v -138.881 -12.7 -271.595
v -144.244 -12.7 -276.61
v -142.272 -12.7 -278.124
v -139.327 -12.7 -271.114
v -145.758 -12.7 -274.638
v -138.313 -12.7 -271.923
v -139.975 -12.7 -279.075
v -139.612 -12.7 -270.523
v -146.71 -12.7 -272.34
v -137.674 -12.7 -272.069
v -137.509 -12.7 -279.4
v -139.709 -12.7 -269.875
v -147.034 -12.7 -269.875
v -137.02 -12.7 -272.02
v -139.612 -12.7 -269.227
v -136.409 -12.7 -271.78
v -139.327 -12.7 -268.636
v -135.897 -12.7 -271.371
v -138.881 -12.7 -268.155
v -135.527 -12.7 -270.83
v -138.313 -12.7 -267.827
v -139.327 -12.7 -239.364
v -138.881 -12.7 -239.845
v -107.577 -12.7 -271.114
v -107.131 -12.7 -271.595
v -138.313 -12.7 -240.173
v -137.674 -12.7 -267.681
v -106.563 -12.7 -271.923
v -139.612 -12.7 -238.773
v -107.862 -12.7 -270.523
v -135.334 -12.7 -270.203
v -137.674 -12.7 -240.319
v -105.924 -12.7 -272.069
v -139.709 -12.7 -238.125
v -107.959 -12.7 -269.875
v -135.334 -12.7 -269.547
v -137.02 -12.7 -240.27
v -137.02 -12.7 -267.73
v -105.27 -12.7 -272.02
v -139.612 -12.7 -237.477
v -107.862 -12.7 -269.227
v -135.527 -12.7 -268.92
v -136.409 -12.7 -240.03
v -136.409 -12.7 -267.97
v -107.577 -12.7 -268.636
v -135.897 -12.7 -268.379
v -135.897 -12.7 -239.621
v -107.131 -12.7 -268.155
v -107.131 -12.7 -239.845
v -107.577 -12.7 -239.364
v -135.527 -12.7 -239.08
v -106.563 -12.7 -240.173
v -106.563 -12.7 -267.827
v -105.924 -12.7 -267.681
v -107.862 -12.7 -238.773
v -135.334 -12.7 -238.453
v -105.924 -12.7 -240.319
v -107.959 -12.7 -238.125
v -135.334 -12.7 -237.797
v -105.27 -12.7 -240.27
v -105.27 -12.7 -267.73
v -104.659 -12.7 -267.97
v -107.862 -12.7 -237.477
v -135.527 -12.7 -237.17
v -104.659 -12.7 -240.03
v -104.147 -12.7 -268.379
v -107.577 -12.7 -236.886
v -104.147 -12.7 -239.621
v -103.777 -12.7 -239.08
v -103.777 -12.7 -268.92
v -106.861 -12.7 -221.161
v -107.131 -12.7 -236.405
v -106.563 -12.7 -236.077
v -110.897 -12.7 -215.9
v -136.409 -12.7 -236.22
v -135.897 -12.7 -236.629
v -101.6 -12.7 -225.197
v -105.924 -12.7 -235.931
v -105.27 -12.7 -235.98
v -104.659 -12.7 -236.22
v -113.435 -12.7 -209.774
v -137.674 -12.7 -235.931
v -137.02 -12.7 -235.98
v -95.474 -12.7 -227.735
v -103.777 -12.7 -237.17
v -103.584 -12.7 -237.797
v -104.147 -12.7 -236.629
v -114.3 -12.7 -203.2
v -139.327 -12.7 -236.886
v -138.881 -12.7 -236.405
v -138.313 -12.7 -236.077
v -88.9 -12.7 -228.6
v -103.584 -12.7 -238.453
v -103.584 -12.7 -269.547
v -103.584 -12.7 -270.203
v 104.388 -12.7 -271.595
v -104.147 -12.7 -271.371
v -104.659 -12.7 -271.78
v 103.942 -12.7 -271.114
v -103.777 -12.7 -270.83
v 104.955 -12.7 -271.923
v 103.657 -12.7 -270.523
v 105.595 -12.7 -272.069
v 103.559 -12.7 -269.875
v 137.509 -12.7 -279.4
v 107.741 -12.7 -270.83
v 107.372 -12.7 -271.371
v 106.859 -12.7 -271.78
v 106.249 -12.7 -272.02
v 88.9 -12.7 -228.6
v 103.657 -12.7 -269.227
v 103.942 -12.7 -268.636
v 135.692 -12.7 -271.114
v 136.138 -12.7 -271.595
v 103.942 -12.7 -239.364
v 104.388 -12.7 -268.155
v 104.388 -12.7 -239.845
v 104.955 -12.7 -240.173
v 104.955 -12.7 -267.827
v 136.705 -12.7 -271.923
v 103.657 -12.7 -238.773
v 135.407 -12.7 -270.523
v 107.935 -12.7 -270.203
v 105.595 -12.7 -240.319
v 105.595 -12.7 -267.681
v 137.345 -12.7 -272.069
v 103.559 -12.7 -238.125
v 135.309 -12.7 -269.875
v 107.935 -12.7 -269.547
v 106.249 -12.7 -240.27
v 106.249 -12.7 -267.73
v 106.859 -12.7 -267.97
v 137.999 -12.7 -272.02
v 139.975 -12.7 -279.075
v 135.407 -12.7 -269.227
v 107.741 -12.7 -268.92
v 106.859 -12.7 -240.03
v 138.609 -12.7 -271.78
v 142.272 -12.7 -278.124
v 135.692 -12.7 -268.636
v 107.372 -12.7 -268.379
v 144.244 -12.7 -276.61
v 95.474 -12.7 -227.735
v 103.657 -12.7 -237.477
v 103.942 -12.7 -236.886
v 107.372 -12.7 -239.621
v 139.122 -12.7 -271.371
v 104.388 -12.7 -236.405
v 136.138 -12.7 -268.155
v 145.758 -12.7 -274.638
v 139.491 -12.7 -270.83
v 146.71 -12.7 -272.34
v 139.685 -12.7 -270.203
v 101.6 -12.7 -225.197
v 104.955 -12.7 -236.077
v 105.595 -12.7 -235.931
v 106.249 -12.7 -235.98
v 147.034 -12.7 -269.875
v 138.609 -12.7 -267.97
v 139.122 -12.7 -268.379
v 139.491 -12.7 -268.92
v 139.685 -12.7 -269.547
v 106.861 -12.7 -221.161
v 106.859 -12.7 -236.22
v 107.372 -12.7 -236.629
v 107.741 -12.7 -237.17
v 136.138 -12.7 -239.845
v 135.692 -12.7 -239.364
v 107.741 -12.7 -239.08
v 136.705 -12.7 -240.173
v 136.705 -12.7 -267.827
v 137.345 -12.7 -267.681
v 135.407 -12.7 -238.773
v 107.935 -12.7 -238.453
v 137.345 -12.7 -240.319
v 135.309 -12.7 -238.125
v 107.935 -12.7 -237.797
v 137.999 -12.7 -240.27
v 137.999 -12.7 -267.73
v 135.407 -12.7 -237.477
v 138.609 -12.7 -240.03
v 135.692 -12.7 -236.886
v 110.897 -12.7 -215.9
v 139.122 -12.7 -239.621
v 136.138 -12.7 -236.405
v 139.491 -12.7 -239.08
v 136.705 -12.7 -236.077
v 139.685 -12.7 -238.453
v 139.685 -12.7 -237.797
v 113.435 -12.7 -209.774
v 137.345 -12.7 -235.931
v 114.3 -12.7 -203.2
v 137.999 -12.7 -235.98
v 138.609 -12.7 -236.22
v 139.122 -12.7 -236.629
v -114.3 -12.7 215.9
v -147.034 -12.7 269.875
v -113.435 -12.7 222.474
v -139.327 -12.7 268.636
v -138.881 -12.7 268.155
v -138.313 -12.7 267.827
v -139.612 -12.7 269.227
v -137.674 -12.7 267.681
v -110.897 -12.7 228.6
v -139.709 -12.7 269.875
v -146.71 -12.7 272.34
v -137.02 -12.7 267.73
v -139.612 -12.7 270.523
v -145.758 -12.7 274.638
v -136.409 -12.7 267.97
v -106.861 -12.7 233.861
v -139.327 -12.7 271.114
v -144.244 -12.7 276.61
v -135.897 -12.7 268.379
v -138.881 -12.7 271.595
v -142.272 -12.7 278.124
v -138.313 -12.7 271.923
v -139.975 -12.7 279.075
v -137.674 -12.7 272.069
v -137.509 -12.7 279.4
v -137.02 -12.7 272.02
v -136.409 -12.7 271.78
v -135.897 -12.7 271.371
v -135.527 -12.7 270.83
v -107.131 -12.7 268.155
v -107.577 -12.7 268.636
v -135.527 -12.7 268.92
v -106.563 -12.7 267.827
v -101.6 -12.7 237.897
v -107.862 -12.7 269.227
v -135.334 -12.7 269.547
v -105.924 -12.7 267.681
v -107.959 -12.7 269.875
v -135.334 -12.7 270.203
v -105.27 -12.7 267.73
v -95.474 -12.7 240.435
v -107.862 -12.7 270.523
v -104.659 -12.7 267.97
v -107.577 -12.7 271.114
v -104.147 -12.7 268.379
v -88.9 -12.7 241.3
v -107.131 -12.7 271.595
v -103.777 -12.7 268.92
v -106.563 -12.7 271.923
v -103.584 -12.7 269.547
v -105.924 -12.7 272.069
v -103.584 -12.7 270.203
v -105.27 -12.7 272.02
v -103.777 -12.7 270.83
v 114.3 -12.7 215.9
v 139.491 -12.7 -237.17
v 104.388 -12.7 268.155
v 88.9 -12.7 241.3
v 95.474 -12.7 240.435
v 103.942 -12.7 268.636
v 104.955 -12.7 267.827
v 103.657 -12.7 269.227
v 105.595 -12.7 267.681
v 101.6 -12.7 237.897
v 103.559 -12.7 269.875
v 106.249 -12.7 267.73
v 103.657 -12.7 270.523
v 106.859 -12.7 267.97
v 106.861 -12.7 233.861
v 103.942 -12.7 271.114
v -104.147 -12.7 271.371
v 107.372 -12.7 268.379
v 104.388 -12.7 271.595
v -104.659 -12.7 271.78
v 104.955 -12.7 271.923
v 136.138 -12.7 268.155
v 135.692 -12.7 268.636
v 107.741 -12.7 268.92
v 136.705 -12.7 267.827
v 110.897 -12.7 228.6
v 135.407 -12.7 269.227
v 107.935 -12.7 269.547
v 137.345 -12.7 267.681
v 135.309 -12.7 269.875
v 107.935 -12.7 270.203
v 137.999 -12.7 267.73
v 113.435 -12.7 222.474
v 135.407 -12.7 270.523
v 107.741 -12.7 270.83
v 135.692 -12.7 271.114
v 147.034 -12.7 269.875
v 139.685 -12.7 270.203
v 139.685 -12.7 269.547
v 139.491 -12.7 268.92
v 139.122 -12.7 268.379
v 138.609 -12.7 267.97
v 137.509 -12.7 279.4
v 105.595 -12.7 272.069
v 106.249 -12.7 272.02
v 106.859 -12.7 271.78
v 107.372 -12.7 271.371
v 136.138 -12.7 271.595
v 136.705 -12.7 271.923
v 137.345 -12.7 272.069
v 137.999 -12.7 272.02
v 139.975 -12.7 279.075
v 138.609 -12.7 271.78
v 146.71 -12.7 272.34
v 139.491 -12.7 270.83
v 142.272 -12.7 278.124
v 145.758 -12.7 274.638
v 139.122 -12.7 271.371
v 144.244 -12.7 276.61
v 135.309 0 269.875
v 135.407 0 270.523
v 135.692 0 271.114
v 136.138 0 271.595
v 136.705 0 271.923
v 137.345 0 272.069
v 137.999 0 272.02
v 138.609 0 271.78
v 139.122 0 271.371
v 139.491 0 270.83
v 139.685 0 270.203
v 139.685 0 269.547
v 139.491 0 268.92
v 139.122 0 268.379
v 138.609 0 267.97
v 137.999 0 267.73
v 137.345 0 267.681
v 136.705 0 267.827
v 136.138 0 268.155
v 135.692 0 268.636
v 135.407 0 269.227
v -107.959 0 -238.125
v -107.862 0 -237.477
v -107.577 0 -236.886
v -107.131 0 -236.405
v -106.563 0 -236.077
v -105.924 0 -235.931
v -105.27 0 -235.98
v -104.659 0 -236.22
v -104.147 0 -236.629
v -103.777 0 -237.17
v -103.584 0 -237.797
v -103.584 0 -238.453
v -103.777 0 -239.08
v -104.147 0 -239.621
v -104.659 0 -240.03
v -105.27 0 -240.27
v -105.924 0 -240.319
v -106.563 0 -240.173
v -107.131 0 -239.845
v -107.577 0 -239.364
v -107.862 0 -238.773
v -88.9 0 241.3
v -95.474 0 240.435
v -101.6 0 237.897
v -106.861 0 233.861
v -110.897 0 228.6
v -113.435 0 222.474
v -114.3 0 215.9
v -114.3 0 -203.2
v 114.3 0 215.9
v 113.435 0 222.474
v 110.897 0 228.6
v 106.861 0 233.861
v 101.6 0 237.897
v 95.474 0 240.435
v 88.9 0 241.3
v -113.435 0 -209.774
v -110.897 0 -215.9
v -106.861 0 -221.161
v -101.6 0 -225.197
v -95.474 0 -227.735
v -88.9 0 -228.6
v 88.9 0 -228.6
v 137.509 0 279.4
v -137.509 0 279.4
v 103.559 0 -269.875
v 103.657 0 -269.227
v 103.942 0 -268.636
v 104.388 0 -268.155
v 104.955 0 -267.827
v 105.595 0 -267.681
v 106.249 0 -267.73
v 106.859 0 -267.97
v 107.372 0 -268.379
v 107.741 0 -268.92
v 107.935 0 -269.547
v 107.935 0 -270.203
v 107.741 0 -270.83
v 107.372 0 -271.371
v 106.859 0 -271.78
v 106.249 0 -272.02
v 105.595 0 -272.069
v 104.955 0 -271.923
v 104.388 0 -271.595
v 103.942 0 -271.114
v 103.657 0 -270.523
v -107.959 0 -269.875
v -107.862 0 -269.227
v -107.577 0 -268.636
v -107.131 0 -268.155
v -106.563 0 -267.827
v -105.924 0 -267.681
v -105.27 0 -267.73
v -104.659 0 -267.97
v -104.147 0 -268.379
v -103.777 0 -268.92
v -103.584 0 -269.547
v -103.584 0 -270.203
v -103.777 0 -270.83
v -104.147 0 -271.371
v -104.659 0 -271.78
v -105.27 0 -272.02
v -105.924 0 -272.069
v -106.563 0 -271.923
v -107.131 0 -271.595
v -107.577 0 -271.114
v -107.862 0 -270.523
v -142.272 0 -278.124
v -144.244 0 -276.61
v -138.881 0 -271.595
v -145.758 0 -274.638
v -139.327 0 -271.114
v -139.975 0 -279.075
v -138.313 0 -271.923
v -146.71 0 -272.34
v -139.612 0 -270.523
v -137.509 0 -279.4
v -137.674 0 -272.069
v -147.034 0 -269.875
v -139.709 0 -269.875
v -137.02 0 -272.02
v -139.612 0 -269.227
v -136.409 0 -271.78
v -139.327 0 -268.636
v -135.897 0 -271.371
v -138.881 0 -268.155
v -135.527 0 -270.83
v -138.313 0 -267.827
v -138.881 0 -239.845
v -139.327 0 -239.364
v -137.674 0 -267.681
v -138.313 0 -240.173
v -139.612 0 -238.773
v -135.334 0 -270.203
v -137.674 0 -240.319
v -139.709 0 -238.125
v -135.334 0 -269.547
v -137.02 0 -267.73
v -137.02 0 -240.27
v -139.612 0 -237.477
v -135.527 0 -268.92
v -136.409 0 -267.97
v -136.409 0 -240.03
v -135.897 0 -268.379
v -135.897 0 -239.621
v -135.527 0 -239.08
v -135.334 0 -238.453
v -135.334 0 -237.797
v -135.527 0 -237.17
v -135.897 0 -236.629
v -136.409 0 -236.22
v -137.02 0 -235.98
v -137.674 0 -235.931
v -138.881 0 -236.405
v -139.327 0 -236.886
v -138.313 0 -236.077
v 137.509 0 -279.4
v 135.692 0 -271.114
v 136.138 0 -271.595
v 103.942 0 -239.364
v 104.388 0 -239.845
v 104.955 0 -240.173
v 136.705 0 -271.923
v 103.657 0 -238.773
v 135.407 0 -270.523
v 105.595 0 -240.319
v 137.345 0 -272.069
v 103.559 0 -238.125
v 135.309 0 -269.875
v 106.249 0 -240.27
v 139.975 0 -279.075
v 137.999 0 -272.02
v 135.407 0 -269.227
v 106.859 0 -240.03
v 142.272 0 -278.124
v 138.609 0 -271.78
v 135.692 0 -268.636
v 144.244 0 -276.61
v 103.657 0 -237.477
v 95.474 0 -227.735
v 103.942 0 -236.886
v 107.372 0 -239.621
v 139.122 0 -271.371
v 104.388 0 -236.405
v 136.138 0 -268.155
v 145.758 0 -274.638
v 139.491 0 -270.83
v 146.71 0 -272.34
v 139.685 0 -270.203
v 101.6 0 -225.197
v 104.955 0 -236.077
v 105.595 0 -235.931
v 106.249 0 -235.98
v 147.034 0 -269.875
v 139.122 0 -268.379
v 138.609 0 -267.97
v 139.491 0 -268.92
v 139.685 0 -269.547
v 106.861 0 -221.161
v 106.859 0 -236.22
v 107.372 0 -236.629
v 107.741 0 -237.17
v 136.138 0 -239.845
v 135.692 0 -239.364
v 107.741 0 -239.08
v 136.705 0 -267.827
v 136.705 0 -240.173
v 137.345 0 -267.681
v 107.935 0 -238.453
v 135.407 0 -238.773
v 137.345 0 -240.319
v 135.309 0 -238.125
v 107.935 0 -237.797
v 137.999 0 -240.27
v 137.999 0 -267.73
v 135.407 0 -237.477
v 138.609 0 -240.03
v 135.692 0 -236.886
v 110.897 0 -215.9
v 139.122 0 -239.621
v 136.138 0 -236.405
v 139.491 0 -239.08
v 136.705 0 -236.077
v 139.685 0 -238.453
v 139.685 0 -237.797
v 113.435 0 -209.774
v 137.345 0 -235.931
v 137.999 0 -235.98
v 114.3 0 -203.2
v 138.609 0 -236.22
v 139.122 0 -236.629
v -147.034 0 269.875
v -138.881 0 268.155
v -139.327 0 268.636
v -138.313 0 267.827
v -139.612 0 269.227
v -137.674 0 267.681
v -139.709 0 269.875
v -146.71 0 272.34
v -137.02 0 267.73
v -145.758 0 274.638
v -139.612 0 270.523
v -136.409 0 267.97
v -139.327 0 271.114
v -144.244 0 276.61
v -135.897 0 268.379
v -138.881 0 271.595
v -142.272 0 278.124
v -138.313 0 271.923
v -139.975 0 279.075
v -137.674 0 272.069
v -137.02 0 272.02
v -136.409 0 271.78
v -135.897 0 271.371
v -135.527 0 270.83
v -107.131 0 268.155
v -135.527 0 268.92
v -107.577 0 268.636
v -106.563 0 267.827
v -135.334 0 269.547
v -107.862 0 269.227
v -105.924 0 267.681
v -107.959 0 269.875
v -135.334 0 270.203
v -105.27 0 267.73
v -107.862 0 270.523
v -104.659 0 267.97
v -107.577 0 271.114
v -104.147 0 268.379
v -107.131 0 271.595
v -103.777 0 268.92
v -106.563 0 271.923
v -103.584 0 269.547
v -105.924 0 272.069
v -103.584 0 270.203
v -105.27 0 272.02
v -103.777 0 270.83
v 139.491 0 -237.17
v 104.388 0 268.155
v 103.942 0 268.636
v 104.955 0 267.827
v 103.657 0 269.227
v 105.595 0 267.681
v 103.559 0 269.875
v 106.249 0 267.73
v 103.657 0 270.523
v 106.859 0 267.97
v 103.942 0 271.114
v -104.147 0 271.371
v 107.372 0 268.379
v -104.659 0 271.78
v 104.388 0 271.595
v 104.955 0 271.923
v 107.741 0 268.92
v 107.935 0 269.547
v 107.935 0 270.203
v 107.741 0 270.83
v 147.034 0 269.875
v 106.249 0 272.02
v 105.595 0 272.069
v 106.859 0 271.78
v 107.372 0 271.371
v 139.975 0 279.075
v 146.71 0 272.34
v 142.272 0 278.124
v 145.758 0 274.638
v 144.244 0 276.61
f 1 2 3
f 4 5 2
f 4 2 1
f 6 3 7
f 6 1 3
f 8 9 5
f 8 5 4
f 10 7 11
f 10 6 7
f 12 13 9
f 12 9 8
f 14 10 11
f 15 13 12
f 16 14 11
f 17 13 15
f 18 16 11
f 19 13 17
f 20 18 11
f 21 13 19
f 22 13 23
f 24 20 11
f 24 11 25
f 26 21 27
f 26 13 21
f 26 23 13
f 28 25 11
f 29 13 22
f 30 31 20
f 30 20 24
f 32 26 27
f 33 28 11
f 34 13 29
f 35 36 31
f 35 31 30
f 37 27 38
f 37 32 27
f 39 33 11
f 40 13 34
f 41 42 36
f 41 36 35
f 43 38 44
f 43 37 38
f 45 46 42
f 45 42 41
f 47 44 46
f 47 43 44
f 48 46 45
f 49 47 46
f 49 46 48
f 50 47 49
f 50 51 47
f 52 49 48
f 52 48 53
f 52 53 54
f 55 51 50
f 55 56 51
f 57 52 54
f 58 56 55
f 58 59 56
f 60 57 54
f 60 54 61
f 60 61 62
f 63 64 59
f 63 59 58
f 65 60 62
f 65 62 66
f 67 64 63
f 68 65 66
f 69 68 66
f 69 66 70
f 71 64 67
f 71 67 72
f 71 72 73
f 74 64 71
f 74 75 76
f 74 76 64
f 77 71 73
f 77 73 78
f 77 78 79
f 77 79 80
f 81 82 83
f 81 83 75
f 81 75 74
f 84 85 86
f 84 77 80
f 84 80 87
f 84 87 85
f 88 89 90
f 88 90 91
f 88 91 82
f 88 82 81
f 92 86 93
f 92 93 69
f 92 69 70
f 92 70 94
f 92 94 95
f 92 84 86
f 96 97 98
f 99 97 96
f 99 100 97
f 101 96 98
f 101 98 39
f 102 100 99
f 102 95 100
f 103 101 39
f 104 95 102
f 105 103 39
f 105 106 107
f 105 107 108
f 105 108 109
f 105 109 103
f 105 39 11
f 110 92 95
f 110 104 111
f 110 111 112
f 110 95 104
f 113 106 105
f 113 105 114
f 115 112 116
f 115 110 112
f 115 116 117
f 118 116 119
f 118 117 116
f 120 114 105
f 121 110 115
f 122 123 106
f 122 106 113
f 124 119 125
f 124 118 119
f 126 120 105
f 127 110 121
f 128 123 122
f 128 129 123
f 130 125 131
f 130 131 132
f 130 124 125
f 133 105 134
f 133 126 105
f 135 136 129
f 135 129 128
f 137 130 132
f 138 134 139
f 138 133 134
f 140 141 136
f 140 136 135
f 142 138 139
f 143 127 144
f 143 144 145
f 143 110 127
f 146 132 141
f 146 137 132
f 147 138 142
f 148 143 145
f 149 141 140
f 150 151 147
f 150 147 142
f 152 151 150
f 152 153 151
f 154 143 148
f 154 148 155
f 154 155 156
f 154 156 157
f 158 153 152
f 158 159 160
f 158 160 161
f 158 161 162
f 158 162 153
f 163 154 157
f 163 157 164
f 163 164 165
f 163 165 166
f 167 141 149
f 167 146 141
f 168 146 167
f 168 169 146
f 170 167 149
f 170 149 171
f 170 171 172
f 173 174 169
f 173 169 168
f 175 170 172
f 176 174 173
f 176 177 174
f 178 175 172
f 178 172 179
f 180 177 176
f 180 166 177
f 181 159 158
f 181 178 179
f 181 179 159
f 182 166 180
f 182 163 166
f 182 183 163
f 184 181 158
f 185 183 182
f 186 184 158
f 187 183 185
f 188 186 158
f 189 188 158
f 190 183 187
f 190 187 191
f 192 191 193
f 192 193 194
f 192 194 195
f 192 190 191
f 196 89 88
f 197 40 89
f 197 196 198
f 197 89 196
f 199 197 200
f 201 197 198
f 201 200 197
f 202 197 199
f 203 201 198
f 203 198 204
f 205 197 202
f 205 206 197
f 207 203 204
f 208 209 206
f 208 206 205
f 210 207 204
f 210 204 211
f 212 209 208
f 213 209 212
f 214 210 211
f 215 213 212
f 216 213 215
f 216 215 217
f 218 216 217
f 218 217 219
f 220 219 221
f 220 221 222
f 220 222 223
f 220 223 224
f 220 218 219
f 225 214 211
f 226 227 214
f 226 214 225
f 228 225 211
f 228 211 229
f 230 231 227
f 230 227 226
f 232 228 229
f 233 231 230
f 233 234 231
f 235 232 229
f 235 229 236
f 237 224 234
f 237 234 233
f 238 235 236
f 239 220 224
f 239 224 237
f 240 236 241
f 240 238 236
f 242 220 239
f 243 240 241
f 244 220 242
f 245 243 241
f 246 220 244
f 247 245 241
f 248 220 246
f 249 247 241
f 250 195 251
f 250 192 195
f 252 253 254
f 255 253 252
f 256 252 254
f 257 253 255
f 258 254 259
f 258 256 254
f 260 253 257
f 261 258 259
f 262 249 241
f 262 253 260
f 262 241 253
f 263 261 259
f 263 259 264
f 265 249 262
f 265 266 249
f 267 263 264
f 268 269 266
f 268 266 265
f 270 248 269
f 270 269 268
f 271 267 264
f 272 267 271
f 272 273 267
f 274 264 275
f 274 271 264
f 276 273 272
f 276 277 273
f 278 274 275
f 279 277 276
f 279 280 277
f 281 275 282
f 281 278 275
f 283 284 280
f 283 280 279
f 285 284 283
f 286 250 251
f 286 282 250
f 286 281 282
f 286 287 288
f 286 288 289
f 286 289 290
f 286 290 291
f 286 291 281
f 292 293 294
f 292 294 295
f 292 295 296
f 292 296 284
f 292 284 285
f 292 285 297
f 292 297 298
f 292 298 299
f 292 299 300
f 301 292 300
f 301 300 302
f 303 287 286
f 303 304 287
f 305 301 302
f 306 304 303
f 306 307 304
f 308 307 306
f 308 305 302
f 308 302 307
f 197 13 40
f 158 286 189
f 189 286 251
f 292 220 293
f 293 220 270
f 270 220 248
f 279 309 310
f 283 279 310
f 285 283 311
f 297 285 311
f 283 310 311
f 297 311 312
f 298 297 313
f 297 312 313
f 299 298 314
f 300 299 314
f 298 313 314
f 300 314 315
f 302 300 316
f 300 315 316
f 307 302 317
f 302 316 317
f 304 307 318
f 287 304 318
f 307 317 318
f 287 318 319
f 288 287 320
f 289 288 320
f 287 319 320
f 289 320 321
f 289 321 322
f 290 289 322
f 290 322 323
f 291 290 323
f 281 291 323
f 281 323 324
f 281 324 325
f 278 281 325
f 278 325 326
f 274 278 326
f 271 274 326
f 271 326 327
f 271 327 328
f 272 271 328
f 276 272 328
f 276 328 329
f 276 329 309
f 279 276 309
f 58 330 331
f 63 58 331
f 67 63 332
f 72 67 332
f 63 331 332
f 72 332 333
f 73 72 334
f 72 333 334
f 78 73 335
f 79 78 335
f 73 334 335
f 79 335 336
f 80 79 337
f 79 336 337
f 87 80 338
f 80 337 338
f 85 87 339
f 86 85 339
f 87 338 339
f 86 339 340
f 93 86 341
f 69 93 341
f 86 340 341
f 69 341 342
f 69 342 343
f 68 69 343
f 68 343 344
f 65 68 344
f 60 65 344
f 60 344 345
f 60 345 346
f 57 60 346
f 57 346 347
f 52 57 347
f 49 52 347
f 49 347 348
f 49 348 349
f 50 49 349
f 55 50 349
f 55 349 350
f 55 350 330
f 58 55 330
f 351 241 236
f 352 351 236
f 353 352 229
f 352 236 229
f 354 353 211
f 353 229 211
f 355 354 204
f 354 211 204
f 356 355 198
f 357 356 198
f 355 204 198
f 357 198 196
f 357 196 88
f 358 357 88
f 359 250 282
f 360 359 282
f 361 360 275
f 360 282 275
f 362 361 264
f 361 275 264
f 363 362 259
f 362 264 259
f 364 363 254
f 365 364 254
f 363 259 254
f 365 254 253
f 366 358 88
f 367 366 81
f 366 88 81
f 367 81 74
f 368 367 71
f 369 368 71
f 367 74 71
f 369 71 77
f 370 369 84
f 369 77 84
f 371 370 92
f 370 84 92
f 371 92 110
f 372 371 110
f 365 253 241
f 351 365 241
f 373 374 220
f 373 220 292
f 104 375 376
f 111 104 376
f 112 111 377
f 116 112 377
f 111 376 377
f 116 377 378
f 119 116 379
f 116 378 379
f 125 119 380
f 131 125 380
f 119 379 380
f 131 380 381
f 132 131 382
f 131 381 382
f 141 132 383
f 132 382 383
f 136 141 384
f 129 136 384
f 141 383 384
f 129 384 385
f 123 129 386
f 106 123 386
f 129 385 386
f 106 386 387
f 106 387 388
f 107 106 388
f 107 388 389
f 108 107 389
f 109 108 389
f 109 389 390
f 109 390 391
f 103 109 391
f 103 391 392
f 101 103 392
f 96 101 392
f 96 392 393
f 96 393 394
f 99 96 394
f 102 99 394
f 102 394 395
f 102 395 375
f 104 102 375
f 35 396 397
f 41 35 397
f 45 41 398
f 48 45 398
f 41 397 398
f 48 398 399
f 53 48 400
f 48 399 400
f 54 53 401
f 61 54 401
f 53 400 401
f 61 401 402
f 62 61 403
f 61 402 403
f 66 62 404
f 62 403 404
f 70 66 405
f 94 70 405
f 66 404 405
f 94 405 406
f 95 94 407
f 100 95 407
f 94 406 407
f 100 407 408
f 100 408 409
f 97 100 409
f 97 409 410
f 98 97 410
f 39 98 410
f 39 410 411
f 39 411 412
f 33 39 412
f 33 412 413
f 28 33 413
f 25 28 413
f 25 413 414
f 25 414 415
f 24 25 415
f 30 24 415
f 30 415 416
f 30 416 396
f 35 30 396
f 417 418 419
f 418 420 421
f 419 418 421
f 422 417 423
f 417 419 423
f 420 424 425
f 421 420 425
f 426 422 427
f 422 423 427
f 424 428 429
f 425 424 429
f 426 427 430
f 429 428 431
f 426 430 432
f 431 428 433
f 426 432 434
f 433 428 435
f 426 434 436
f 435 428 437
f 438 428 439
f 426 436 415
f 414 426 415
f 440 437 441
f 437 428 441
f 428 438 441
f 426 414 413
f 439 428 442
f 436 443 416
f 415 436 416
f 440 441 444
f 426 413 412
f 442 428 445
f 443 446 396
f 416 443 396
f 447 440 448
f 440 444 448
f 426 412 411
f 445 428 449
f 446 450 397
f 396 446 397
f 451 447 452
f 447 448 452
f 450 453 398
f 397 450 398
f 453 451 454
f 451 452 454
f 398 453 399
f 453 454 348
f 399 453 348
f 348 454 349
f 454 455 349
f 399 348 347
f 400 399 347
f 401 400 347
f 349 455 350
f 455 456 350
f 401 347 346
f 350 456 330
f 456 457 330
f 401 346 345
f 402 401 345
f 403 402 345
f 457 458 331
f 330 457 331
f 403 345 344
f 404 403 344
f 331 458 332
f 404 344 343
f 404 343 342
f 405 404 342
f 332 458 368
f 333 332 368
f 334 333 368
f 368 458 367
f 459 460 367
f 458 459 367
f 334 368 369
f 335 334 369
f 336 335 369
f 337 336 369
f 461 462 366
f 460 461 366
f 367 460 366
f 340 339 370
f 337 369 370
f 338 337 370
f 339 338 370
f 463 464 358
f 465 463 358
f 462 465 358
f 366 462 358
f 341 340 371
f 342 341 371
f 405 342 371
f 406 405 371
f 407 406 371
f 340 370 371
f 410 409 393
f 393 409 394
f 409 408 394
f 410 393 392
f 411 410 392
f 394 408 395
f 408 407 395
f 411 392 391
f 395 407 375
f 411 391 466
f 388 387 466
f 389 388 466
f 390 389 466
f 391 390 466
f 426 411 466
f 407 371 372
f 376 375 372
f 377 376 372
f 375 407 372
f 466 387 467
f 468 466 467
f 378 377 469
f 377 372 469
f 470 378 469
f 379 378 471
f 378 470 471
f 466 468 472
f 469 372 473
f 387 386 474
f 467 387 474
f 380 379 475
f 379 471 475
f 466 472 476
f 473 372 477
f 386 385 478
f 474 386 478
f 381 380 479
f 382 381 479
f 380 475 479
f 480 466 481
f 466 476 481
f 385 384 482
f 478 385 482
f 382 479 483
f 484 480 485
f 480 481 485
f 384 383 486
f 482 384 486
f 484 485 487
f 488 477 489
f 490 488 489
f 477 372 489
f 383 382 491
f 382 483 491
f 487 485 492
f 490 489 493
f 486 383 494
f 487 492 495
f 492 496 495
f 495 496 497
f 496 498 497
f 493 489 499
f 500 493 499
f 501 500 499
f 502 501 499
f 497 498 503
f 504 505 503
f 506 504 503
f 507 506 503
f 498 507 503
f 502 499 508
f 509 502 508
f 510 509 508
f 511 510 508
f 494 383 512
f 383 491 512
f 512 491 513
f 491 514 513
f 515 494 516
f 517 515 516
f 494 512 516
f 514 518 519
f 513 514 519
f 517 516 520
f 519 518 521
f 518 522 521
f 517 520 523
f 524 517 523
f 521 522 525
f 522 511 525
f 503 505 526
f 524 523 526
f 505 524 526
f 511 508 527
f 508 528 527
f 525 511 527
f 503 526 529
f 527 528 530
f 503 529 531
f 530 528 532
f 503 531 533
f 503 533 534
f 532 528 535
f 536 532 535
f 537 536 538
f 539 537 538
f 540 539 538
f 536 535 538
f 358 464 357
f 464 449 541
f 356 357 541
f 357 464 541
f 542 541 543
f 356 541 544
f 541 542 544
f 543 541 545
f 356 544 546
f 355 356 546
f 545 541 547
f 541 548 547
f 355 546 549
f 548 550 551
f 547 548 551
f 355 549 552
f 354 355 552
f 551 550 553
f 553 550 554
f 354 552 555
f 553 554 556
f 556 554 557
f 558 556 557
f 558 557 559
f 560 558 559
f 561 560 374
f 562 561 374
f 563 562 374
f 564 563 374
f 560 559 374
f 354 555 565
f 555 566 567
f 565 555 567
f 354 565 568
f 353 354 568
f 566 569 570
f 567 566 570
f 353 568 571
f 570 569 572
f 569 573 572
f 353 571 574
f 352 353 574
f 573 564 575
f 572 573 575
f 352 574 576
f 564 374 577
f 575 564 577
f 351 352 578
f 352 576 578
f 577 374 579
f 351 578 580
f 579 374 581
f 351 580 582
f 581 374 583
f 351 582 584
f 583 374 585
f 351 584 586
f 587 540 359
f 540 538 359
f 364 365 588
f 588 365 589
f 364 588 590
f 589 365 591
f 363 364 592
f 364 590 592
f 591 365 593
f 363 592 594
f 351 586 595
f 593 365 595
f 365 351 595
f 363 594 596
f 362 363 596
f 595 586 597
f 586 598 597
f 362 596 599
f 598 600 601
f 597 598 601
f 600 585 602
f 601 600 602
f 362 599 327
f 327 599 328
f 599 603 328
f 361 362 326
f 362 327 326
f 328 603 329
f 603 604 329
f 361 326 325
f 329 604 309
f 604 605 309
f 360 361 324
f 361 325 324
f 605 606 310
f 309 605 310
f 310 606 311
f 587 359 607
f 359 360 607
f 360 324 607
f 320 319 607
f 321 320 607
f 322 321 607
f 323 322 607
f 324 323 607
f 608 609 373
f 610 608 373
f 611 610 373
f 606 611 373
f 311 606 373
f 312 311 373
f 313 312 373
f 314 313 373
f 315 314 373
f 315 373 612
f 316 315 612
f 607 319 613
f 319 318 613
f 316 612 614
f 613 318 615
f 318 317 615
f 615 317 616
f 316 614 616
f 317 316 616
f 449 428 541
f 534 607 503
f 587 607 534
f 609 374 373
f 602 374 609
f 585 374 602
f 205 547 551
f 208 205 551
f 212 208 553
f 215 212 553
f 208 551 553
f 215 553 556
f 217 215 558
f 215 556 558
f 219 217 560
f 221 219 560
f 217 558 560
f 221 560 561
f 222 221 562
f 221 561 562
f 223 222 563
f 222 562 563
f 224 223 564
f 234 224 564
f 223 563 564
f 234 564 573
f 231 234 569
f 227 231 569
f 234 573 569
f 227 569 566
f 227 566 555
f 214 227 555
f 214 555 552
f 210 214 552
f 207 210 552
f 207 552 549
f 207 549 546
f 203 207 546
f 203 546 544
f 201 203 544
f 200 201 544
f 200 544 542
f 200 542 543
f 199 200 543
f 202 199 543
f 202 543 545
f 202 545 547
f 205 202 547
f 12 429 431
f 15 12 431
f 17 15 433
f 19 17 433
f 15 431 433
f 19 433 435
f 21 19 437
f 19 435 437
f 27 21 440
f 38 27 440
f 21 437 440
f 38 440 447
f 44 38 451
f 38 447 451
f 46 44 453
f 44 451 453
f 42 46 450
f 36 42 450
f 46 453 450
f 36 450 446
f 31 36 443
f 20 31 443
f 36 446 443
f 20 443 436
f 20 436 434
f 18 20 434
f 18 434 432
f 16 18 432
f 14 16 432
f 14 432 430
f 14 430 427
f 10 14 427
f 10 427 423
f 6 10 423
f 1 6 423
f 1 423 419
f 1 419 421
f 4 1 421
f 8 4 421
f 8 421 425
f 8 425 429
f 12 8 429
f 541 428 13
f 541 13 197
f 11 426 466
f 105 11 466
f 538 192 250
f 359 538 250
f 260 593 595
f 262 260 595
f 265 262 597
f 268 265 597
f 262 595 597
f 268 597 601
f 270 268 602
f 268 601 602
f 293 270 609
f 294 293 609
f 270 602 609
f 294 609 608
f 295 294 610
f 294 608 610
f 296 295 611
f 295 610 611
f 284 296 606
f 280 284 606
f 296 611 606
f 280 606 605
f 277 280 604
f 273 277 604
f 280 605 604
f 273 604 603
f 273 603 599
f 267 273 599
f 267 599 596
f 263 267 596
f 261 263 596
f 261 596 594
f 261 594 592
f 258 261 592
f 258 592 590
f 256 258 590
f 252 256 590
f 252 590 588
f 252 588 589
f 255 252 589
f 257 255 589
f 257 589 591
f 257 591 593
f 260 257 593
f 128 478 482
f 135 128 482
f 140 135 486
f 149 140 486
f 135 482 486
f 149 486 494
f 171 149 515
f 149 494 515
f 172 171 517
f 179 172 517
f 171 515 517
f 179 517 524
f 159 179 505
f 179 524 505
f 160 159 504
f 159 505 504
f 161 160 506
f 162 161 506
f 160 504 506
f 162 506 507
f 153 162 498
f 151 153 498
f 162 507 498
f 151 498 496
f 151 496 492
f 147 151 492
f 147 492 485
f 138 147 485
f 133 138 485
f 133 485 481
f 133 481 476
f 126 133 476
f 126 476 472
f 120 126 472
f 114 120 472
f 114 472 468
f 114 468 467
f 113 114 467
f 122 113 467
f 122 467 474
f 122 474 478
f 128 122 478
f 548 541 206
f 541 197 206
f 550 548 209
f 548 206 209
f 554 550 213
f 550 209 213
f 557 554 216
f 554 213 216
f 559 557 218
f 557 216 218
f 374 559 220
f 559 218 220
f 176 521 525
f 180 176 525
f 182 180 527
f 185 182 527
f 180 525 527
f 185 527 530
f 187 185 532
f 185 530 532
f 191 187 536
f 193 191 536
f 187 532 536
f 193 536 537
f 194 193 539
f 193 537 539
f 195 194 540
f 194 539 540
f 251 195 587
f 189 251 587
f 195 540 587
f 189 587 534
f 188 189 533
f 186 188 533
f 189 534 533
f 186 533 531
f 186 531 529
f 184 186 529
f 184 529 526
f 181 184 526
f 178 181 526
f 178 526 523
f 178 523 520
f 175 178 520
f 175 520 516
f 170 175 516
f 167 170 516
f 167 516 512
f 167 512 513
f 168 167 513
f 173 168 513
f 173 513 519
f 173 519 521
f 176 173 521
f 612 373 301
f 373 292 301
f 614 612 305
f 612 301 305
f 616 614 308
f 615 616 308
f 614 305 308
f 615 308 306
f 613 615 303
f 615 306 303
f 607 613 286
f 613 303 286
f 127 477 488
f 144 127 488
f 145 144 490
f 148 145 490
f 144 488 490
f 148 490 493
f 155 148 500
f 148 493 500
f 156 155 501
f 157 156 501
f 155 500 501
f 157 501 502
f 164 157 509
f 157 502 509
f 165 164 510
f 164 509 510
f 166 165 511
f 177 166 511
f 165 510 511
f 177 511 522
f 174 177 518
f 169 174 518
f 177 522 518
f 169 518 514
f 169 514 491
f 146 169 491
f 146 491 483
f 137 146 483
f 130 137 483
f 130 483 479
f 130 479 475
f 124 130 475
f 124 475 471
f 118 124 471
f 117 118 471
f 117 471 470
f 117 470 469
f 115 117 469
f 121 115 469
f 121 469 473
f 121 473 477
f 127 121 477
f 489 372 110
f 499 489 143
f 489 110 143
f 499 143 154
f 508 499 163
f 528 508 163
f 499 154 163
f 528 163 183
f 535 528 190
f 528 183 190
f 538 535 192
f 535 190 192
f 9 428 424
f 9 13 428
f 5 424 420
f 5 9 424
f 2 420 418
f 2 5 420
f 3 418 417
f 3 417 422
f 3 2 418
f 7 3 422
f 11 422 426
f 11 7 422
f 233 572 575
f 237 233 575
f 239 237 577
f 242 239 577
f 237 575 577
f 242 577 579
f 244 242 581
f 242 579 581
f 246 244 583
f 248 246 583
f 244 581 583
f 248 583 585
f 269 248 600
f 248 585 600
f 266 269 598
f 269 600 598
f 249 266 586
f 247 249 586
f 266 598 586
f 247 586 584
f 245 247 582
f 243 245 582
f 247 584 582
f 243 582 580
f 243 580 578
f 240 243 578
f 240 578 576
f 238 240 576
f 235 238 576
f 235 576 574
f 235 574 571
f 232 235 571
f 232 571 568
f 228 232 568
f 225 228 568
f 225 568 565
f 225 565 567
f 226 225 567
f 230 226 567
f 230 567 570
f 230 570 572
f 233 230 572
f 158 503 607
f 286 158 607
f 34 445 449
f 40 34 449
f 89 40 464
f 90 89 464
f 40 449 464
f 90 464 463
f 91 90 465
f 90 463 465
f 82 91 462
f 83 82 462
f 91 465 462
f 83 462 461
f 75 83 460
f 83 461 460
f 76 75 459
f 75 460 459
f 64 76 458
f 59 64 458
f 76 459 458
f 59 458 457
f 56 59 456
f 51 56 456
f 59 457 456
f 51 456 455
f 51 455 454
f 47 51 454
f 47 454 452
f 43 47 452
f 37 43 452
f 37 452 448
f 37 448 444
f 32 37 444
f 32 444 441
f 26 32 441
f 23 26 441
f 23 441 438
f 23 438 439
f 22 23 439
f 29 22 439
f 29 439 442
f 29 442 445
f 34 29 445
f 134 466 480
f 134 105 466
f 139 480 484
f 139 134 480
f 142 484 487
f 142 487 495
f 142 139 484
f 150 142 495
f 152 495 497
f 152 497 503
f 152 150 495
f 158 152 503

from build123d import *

# Parameters (mm, degrees)
F0_W     = 294.0685
F0_H     = 558.8
F1_DEPTH = 12.7
F3_D     = 4.4
F4_R     = 9.525
F6_DEPTH = 12.701


with BuildPart() as f1:
    # F0 (on Front) → F1 (new body)
    with BuildSketch(Plane.XZ):
        Rectangle(F0_W, F0_H)
    extrude(amount=F1_DEPTH)

    # F3 (through all)
    with Locations(Plane.XZ.offset(12.7)):
        with Locations((-137.50925, 269.875), (-105.75925, 269.875), (105.75925, 269.875), (137.50925, 269.875), (105.75925, -238.125), (137.50925, -238.125), (137.50925, -269.875), (105.75925, -269.875), (-105.75925, -269.875), (-137.50925, -269.875), (-137.50925, -238.125), (-105.75925, -238.125)):
            Hole(F3_D / 2)

    # F4
    f4_edges = [f1.edges().sort_by_distance(p)[0] for p in [
        (147.03425, -6.35, 279.4),
        (147.03425, -6.35, -279.4),
        (-147.03425, -6.35, -279.4),
        (-147.03425, -6.35, 279.4),
    ]]
    fillet(f4_edges, radius=F4_R)

    # F5 (on face) → F6 (cut, through all)
    with BuildSketch(Plane.XZ.offset(12.7)):
        with BuildLine():
            Line((88.9, 241.3), (-88.9, 241.3))
            ThreePointArc((-88.9, 241.3), (-106.8605122421, 233.8605122421), (-114.3, 215.9))
            Line((-114.3, 215.9), (-114.3, -203.2))
            ThreePointArc((-114.3, -203.2), (-106.8605122421, -221.1605122421), (-88.9, -228.6))
            Line((-88.9, -228.6), (88.9, -228.6))
            ThreePointArc((88.9, -228.6), (106.8605122421, -221.1605122421), (114.3, -203.2))
            Line((114.3, -203.2), (114.3, 215.9))
            ThreePointArc((114.3, 215.9), (106.8605122421, 233.8605122421), (88.9, 241.3))
        make_face()
    extrude(amount=-F6_DEPTH, mode=Mode.SUBTRACT)


solid = f1.part
